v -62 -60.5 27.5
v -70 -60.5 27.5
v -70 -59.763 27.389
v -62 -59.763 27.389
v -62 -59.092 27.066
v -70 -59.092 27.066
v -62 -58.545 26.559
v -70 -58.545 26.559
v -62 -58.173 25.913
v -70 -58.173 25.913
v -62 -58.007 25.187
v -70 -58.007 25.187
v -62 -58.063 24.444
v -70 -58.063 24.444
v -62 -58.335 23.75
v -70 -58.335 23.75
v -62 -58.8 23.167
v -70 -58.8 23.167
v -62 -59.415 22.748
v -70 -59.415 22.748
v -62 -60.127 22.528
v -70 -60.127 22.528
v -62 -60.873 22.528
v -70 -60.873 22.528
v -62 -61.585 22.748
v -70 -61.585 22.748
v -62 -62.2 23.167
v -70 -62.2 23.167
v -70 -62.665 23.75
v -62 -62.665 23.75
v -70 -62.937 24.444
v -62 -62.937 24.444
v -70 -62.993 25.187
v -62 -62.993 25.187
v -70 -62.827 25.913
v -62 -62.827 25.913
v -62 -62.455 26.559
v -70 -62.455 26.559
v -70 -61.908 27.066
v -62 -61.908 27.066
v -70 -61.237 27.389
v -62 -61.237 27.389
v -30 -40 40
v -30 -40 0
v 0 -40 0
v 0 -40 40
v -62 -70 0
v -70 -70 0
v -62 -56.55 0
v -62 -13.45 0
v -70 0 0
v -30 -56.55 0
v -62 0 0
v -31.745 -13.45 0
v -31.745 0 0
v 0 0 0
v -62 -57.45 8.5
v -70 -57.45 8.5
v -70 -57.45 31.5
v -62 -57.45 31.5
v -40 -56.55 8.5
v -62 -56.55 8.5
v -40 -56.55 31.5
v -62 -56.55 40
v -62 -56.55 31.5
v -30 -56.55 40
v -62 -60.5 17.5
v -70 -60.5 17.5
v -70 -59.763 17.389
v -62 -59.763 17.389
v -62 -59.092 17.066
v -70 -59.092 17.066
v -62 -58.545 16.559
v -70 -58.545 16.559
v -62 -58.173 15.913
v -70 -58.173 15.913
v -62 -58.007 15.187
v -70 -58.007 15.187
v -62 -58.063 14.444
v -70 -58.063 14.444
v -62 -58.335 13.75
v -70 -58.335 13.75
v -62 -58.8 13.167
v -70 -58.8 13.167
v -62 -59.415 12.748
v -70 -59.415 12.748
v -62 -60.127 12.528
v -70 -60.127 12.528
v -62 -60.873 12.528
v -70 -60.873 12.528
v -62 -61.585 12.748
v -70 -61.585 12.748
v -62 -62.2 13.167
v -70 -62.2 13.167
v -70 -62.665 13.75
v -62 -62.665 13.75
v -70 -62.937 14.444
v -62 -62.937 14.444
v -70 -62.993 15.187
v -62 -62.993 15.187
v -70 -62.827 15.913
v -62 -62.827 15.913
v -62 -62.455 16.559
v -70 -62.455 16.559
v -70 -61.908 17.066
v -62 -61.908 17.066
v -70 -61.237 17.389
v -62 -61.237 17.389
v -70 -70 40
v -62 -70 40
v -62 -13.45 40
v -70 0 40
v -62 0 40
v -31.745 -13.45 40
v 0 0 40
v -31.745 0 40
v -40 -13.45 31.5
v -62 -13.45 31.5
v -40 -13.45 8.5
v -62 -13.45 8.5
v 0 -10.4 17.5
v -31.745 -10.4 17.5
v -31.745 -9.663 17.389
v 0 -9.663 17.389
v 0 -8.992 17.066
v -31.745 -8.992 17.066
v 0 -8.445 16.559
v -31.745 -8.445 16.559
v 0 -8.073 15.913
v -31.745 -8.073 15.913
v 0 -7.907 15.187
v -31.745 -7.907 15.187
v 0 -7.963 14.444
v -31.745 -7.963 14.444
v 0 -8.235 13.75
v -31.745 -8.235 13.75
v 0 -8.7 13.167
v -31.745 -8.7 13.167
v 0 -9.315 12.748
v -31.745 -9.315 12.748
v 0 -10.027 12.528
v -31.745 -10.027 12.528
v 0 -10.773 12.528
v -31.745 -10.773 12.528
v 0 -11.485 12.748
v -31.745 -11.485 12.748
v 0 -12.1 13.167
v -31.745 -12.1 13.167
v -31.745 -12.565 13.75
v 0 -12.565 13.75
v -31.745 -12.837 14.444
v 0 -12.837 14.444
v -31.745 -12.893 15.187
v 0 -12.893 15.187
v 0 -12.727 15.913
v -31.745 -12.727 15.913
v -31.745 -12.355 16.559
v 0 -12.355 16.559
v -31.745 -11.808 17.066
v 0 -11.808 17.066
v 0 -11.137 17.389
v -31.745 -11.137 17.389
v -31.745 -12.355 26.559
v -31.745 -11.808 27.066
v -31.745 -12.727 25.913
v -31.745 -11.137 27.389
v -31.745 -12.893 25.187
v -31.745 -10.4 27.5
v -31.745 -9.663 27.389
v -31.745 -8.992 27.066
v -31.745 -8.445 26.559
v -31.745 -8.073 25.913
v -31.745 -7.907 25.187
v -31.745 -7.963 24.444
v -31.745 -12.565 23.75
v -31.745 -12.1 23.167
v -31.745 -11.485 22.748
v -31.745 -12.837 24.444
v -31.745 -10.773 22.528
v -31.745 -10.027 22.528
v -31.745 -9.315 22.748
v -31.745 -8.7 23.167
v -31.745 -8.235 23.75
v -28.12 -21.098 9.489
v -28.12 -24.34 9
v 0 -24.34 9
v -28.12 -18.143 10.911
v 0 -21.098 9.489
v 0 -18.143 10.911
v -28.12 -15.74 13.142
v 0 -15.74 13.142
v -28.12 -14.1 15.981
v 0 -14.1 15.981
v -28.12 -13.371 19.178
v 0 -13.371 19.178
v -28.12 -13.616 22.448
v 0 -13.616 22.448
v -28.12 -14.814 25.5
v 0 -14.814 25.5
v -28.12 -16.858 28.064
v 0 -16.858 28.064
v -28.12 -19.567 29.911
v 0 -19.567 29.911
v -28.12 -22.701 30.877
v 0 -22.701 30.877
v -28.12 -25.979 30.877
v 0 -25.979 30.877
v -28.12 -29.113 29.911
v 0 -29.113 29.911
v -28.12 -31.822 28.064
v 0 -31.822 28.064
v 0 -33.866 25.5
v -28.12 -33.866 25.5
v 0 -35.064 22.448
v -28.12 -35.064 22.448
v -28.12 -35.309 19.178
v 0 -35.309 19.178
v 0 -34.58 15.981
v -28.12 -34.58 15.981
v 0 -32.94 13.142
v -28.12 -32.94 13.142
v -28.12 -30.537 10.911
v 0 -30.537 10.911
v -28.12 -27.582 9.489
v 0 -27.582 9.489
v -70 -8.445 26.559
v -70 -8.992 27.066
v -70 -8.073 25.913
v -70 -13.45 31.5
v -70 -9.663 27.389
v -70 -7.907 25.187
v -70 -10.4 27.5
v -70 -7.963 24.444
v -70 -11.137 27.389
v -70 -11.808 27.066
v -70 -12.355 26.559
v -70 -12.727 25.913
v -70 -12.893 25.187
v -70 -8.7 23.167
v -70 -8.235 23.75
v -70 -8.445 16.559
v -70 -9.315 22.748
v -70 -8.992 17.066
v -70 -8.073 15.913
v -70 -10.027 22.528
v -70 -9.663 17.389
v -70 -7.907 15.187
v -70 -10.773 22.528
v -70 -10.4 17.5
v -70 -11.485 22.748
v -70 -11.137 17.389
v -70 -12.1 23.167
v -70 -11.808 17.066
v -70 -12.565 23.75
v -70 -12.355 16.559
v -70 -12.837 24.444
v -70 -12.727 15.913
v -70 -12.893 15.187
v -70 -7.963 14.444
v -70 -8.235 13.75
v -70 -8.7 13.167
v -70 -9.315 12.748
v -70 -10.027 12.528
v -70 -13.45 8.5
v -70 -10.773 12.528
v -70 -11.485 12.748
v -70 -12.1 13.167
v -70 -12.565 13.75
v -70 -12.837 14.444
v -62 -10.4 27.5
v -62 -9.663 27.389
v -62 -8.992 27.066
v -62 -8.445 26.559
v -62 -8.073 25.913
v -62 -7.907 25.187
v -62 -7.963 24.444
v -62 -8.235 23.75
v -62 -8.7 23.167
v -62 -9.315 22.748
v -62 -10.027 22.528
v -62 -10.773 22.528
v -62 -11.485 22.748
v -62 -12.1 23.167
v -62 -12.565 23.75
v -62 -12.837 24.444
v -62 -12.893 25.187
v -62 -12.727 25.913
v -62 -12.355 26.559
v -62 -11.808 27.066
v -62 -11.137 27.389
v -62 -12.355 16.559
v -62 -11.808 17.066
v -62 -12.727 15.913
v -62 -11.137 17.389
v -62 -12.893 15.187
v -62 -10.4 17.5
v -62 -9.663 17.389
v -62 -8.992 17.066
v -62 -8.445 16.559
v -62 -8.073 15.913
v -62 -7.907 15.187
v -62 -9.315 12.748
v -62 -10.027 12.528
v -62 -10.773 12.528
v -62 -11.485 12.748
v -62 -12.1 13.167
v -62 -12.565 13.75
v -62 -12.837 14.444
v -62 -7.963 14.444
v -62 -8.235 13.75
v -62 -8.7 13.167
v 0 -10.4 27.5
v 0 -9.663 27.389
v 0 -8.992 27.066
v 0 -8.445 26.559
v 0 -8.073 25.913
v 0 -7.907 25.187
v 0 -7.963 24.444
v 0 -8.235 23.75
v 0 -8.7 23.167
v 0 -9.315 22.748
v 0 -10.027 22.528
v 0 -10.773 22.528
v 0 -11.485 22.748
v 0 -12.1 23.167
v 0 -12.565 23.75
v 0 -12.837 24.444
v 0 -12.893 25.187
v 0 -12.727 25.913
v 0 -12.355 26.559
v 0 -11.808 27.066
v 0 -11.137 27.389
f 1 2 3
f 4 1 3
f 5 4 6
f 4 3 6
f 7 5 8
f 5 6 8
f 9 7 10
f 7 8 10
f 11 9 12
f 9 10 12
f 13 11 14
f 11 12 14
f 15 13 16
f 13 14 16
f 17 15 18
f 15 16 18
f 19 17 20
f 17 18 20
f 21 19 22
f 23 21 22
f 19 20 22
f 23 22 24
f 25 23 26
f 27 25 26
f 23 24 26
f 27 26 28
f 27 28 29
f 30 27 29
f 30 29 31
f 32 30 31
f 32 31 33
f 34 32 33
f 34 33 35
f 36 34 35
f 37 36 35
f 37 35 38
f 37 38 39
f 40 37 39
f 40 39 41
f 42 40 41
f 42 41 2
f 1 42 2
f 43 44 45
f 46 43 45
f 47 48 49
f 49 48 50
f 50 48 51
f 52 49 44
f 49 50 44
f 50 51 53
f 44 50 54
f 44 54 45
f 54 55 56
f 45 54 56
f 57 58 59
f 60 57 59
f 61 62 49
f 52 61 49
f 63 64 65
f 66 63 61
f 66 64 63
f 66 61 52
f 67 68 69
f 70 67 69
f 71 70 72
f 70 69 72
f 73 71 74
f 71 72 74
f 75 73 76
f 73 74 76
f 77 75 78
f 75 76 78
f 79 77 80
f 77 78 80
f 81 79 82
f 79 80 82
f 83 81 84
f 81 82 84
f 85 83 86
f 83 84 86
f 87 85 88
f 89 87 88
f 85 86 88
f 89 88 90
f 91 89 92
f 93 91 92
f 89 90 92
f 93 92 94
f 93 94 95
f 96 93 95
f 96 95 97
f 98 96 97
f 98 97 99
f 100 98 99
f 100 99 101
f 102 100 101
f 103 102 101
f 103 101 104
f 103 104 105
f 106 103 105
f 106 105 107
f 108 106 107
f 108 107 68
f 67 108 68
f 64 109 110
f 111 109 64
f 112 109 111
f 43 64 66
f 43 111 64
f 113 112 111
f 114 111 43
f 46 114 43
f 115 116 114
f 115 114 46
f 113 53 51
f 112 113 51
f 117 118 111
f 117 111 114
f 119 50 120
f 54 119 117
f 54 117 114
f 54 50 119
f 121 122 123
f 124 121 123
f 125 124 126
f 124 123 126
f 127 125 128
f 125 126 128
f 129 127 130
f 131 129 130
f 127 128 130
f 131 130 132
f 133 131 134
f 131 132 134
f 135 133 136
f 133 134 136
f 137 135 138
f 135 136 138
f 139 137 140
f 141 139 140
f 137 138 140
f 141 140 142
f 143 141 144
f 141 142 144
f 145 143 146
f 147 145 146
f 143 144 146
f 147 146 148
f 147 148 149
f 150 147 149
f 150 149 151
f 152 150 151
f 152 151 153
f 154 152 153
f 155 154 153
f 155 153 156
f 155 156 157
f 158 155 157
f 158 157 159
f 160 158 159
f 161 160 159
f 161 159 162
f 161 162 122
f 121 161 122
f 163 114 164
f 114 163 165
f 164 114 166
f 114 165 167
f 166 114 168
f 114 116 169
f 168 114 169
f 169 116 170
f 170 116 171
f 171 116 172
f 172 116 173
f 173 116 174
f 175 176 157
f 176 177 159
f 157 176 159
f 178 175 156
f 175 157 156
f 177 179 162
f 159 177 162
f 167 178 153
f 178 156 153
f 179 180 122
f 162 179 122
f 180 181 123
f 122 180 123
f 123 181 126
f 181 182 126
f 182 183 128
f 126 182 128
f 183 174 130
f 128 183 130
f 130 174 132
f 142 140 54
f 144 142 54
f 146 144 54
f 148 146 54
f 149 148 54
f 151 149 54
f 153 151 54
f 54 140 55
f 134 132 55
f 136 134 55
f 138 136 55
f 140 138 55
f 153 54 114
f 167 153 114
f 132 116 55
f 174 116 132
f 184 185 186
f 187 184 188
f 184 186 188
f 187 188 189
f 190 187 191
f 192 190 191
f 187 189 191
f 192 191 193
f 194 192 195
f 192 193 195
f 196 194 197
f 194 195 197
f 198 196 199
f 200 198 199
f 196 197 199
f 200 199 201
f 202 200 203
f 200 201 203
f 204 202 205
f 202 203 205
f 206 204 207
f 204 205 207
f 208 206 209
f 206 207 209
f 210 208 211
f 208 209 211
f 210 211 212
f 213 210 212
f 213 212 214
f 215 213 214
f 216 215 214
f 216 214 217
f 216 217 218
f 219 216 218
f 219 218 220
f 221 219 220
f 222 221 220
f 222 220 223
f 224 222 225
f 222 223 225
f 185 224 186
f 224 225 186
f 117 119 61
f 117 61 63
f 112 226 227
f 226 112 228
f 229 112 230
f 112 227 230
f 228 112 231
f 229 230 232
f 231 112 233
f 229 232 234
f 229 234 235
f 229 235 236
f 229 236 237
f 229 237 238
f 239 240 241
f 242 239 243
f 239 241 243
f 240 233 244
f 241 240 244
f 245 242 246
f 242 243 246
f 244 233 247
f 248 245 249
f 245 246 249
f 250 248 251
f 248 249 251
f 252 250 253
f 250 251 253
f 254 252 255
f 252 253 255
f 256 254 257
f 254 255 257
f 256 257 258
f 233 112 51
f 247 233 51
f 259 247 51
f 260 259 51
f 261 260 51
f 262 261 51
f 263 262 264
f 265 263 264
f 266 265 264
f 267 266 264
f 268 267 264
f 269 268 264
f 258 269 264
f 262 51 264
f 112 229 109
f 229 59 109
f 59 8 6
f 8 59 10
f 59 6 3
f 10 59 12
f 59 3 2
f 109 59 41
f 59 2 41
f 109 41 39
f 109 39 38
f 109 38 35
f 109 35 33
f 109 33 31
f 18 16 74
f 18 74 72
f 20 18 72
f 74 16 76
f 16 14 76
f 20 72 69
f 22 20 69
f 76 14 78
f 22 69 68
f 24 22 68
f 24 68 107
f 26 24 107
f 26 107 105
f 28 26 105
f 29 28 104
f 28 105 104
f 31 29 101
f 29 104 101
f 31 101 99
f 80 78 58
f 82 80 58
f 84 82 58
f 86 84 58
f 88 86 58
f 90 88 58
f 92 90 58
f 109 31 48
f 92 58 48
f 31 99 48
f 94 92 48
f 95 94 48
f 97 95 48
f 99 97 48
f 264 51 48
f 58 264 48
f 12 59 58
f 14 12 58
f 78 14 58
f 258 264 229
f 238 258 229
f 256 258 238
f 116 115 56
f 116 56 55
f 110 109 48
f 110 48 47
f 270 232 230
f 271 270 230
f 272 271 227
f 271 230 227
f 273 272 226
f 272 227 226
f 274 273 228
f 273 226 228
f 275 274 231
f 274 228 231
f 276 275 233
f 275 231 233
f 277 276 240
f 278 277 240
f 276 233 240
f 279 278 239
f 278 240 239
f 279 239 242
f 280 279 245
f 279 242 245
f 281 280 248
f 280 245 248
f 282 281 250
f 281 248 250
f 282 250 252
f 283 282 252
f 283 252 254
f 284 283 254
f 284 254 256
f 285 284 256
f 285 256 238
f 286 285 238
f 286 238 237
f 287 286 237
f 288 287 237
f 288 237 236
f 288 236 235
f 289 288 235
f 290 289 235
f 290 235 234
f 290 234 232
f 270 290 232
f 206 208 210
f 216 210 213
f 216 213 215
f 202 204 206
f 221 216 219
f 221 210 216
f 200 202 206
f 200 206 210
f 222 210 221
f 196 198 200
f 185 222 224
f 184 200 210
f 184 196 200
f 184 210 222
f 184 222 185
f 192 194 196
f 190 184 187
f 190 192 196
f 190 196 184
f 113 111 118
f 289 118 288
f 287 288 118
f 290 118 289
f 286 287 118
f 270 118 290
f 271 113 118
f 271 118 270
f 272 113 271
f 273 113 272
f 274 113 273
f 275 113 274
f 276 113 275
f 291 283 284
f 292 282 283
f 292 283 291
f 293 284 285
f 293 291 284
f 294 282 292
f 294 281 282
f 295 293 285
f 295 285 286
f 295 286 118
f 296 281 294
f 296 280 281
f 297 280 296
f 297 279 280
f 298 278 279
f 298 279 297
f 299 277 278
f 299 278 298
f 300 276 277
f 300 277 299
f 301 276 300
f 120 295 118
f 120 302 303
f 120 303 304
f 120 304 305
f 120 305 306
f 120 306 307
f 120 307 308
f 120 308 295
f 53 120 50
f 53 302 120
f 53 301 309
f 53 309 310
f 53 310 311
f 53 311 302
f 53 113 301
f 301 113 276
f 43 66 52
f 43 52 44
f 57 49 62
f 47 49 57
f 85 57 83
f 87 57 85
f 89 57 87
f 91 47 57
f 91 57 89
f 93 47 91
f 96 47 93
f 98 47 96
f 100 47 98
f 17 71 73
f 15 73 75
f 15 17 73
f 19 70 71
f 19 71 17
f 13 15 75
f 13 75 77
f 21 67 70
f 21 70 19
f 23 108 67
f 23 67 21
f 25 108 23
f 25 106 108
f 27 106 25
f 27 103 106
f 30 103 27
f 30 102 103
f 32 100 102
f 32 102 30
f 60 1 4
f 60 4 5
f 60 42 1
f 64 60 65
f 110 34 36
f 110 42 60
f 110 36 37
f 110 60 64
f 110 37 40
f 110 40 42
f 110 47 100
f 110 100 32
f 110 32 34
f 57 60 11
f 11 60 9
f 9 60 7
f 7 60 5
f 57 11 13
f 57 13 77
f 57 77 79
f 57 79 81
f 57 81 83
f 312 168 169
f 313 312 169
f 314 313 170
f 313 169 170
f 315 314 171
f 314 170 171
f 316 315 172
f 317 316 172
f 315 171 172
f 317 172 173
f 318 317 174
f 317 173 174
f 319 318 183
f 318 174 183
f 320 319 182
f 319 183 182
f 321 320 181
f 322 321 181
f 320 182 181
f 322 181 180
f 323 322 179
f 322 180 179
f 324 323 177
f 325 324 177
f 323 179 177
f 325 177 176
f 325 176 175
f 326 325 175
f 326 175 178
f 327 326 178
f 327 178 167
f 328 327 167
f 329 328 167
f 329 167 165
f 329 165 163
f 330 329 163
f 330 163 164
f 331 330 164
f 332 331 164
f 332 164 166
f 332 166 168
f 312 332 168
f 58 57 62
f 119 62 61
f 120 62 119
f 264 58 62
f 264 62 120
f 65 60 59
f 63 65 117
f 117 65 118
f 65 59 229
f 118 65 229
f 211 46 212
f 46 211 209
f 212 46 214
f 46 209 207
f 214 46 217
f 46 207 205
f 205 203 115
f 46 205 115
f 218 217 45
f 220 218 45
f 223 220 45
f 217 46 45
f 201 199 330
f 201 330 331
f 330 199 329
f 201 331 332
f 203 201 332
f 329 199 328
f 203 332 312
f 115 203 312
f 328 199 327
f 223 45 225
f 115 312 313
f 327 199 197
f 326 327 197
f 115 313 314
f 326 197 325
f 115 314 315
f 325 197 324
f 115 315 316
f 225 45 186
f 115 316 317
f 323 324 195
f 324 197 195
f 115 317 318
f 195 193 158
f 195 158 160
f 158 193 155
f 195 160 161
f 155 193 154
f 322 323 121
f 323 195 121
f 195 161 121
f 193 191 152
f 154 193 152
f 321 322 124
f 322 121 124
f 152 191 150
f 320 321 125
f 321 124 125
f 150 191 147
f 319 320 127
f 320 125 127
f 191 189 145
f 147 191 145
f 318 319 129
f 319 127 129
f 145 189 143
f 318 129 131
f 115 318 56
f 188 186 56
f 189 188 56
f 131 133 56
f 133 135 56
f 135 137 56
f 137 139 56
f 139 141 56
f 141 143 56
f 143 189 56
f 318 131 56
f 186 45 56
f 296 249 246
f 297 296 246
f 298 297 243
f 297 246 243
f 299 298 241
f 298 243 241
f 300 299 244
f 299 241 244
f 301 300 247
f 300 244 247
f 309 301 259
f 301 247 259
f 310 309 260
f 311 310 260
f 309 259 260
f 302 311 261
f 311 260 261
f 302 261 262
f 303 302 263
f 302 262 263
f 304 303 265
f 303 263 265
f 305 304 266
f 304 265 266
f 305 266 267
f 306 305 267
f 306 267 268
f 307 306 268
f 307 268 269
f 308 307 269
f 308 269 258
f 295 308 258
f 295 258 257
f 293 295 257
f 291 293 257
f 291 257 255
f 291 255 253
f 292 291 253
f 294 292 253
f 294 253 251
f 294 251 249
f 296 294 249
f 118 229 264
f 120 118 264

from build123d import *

# Parameters (mm, degrees)
BOSS_EXTRUDE1_DEPTH = 40
SKETCH3_W           = 11.5
SKETCH3_H           = 44
CUT_EXTRUDE1_DEPTH  = 30
SKETCH4_W           = 30.254833929
SKETCH4_H           = 40
CUT_EXTRUDE2_DEPTH  = 13.45
SKETCH5_W           = 32
SKETCH5_H           = 40
CUT_EXTRUDE3_DEPTH  = 13.45
SKETCH6_R           = 2.5
CUT_EXTRUDE4_DEPTH  = 100
CUT_EXTRUDE5_DEPTH  = 28.12


with BuildPart() as part:
    # Sketch1 → Boss-Extrude1 (new body)
    with BuildSketch(Plane.XY):
        Polygon((0, 0), (-70, 0), (-70, -70), (-30, -70), (-30, -40), (0, -40), align=None)
    extrude(amount=BOSS_EXTRUDE1_DEPTH)

    # Sketch3 → Cut-Extrude1 (cut)
    with BuildSketch(Plane.ZY.offset(70)):
        with Locations((14.25, -35.45)):
            Rectangle(SKETCH3_W, SKETCH3_H)
        with Locations((25.75, -35.45)):
            Rectangle(SKETCH3_W, SKETCH3_H)
    extrude(amount=-CUT_EXTRUDE1_DEPTH, mode=Mode.SUBTRACT)

    # Sketch4 → Cut-Extrude2 (cut)
    with BuildSketch(Plane(origin=(0, 0, 0), x_dir=(1, 0, 0), z_dir=(0, 1, 0))):
        with Locations((-46.872583036, -20)):
            Rectangle(SKETCH4_W, SKETCH4_H)
    extrude(amount=-CUT_EXTRUDE2_DEPTH, mode=Mode.SUBTRACT)

    # Sketch5 → Cut-Extrude3 (cut)
    with BuildSketch(Plane.XZ.offset(70)):
        with Locations((-46, 20)):
            Rectangle(SKETCH5_W, SKETCH5_H)
    extrude(amount=-CUT_EXTRUDE3_DEPTH, mode=Mode.SUBTRACT)

    # Sketch6 → Cut-Extrude4 (cut)
    with BuildSketch(Plane.ZY.offset(70)):
        with Locations((15, -10.4)):
            Circle(SKETCH6_R)
        with Locations((25, -10.4)):
            Circle(SKETCH6_R)
        with Locations((25, -60.5)):
            Circle(SKETCH6_R)
        with Locations((15, -60.5)):
            Circle(SKETCH6_R)
    extrude(amount=-CUT_EXTRUDE4_DEPTH, mode=Mode.SUBTRACT)

    # Sketch7 → Cut-Extrude5 (cut)
    with BuildSketch(Plane(origin=(0, 0, 0), x_dir=(0, 0, -1), z_dir=(1, 0, 0))):
        with BuildLine():
            ThreePointArc((-31, -24.34), (-20, -35.34), (-9, -24.34))
            Line((-9, -24.34), (-31, -24.34))
        make_face()
        with BuildLine():
            Line((-31, -24.34), (-9, -24.34))
            ThreePointArc((-9, -24.34), (-20, -13.34), (-31, -24.34))
        make_face()
    extrude(amount=-CUT_EXTRUDE5_DEPTH, mode=Mode.SUBTRACT)


solid = part.part
